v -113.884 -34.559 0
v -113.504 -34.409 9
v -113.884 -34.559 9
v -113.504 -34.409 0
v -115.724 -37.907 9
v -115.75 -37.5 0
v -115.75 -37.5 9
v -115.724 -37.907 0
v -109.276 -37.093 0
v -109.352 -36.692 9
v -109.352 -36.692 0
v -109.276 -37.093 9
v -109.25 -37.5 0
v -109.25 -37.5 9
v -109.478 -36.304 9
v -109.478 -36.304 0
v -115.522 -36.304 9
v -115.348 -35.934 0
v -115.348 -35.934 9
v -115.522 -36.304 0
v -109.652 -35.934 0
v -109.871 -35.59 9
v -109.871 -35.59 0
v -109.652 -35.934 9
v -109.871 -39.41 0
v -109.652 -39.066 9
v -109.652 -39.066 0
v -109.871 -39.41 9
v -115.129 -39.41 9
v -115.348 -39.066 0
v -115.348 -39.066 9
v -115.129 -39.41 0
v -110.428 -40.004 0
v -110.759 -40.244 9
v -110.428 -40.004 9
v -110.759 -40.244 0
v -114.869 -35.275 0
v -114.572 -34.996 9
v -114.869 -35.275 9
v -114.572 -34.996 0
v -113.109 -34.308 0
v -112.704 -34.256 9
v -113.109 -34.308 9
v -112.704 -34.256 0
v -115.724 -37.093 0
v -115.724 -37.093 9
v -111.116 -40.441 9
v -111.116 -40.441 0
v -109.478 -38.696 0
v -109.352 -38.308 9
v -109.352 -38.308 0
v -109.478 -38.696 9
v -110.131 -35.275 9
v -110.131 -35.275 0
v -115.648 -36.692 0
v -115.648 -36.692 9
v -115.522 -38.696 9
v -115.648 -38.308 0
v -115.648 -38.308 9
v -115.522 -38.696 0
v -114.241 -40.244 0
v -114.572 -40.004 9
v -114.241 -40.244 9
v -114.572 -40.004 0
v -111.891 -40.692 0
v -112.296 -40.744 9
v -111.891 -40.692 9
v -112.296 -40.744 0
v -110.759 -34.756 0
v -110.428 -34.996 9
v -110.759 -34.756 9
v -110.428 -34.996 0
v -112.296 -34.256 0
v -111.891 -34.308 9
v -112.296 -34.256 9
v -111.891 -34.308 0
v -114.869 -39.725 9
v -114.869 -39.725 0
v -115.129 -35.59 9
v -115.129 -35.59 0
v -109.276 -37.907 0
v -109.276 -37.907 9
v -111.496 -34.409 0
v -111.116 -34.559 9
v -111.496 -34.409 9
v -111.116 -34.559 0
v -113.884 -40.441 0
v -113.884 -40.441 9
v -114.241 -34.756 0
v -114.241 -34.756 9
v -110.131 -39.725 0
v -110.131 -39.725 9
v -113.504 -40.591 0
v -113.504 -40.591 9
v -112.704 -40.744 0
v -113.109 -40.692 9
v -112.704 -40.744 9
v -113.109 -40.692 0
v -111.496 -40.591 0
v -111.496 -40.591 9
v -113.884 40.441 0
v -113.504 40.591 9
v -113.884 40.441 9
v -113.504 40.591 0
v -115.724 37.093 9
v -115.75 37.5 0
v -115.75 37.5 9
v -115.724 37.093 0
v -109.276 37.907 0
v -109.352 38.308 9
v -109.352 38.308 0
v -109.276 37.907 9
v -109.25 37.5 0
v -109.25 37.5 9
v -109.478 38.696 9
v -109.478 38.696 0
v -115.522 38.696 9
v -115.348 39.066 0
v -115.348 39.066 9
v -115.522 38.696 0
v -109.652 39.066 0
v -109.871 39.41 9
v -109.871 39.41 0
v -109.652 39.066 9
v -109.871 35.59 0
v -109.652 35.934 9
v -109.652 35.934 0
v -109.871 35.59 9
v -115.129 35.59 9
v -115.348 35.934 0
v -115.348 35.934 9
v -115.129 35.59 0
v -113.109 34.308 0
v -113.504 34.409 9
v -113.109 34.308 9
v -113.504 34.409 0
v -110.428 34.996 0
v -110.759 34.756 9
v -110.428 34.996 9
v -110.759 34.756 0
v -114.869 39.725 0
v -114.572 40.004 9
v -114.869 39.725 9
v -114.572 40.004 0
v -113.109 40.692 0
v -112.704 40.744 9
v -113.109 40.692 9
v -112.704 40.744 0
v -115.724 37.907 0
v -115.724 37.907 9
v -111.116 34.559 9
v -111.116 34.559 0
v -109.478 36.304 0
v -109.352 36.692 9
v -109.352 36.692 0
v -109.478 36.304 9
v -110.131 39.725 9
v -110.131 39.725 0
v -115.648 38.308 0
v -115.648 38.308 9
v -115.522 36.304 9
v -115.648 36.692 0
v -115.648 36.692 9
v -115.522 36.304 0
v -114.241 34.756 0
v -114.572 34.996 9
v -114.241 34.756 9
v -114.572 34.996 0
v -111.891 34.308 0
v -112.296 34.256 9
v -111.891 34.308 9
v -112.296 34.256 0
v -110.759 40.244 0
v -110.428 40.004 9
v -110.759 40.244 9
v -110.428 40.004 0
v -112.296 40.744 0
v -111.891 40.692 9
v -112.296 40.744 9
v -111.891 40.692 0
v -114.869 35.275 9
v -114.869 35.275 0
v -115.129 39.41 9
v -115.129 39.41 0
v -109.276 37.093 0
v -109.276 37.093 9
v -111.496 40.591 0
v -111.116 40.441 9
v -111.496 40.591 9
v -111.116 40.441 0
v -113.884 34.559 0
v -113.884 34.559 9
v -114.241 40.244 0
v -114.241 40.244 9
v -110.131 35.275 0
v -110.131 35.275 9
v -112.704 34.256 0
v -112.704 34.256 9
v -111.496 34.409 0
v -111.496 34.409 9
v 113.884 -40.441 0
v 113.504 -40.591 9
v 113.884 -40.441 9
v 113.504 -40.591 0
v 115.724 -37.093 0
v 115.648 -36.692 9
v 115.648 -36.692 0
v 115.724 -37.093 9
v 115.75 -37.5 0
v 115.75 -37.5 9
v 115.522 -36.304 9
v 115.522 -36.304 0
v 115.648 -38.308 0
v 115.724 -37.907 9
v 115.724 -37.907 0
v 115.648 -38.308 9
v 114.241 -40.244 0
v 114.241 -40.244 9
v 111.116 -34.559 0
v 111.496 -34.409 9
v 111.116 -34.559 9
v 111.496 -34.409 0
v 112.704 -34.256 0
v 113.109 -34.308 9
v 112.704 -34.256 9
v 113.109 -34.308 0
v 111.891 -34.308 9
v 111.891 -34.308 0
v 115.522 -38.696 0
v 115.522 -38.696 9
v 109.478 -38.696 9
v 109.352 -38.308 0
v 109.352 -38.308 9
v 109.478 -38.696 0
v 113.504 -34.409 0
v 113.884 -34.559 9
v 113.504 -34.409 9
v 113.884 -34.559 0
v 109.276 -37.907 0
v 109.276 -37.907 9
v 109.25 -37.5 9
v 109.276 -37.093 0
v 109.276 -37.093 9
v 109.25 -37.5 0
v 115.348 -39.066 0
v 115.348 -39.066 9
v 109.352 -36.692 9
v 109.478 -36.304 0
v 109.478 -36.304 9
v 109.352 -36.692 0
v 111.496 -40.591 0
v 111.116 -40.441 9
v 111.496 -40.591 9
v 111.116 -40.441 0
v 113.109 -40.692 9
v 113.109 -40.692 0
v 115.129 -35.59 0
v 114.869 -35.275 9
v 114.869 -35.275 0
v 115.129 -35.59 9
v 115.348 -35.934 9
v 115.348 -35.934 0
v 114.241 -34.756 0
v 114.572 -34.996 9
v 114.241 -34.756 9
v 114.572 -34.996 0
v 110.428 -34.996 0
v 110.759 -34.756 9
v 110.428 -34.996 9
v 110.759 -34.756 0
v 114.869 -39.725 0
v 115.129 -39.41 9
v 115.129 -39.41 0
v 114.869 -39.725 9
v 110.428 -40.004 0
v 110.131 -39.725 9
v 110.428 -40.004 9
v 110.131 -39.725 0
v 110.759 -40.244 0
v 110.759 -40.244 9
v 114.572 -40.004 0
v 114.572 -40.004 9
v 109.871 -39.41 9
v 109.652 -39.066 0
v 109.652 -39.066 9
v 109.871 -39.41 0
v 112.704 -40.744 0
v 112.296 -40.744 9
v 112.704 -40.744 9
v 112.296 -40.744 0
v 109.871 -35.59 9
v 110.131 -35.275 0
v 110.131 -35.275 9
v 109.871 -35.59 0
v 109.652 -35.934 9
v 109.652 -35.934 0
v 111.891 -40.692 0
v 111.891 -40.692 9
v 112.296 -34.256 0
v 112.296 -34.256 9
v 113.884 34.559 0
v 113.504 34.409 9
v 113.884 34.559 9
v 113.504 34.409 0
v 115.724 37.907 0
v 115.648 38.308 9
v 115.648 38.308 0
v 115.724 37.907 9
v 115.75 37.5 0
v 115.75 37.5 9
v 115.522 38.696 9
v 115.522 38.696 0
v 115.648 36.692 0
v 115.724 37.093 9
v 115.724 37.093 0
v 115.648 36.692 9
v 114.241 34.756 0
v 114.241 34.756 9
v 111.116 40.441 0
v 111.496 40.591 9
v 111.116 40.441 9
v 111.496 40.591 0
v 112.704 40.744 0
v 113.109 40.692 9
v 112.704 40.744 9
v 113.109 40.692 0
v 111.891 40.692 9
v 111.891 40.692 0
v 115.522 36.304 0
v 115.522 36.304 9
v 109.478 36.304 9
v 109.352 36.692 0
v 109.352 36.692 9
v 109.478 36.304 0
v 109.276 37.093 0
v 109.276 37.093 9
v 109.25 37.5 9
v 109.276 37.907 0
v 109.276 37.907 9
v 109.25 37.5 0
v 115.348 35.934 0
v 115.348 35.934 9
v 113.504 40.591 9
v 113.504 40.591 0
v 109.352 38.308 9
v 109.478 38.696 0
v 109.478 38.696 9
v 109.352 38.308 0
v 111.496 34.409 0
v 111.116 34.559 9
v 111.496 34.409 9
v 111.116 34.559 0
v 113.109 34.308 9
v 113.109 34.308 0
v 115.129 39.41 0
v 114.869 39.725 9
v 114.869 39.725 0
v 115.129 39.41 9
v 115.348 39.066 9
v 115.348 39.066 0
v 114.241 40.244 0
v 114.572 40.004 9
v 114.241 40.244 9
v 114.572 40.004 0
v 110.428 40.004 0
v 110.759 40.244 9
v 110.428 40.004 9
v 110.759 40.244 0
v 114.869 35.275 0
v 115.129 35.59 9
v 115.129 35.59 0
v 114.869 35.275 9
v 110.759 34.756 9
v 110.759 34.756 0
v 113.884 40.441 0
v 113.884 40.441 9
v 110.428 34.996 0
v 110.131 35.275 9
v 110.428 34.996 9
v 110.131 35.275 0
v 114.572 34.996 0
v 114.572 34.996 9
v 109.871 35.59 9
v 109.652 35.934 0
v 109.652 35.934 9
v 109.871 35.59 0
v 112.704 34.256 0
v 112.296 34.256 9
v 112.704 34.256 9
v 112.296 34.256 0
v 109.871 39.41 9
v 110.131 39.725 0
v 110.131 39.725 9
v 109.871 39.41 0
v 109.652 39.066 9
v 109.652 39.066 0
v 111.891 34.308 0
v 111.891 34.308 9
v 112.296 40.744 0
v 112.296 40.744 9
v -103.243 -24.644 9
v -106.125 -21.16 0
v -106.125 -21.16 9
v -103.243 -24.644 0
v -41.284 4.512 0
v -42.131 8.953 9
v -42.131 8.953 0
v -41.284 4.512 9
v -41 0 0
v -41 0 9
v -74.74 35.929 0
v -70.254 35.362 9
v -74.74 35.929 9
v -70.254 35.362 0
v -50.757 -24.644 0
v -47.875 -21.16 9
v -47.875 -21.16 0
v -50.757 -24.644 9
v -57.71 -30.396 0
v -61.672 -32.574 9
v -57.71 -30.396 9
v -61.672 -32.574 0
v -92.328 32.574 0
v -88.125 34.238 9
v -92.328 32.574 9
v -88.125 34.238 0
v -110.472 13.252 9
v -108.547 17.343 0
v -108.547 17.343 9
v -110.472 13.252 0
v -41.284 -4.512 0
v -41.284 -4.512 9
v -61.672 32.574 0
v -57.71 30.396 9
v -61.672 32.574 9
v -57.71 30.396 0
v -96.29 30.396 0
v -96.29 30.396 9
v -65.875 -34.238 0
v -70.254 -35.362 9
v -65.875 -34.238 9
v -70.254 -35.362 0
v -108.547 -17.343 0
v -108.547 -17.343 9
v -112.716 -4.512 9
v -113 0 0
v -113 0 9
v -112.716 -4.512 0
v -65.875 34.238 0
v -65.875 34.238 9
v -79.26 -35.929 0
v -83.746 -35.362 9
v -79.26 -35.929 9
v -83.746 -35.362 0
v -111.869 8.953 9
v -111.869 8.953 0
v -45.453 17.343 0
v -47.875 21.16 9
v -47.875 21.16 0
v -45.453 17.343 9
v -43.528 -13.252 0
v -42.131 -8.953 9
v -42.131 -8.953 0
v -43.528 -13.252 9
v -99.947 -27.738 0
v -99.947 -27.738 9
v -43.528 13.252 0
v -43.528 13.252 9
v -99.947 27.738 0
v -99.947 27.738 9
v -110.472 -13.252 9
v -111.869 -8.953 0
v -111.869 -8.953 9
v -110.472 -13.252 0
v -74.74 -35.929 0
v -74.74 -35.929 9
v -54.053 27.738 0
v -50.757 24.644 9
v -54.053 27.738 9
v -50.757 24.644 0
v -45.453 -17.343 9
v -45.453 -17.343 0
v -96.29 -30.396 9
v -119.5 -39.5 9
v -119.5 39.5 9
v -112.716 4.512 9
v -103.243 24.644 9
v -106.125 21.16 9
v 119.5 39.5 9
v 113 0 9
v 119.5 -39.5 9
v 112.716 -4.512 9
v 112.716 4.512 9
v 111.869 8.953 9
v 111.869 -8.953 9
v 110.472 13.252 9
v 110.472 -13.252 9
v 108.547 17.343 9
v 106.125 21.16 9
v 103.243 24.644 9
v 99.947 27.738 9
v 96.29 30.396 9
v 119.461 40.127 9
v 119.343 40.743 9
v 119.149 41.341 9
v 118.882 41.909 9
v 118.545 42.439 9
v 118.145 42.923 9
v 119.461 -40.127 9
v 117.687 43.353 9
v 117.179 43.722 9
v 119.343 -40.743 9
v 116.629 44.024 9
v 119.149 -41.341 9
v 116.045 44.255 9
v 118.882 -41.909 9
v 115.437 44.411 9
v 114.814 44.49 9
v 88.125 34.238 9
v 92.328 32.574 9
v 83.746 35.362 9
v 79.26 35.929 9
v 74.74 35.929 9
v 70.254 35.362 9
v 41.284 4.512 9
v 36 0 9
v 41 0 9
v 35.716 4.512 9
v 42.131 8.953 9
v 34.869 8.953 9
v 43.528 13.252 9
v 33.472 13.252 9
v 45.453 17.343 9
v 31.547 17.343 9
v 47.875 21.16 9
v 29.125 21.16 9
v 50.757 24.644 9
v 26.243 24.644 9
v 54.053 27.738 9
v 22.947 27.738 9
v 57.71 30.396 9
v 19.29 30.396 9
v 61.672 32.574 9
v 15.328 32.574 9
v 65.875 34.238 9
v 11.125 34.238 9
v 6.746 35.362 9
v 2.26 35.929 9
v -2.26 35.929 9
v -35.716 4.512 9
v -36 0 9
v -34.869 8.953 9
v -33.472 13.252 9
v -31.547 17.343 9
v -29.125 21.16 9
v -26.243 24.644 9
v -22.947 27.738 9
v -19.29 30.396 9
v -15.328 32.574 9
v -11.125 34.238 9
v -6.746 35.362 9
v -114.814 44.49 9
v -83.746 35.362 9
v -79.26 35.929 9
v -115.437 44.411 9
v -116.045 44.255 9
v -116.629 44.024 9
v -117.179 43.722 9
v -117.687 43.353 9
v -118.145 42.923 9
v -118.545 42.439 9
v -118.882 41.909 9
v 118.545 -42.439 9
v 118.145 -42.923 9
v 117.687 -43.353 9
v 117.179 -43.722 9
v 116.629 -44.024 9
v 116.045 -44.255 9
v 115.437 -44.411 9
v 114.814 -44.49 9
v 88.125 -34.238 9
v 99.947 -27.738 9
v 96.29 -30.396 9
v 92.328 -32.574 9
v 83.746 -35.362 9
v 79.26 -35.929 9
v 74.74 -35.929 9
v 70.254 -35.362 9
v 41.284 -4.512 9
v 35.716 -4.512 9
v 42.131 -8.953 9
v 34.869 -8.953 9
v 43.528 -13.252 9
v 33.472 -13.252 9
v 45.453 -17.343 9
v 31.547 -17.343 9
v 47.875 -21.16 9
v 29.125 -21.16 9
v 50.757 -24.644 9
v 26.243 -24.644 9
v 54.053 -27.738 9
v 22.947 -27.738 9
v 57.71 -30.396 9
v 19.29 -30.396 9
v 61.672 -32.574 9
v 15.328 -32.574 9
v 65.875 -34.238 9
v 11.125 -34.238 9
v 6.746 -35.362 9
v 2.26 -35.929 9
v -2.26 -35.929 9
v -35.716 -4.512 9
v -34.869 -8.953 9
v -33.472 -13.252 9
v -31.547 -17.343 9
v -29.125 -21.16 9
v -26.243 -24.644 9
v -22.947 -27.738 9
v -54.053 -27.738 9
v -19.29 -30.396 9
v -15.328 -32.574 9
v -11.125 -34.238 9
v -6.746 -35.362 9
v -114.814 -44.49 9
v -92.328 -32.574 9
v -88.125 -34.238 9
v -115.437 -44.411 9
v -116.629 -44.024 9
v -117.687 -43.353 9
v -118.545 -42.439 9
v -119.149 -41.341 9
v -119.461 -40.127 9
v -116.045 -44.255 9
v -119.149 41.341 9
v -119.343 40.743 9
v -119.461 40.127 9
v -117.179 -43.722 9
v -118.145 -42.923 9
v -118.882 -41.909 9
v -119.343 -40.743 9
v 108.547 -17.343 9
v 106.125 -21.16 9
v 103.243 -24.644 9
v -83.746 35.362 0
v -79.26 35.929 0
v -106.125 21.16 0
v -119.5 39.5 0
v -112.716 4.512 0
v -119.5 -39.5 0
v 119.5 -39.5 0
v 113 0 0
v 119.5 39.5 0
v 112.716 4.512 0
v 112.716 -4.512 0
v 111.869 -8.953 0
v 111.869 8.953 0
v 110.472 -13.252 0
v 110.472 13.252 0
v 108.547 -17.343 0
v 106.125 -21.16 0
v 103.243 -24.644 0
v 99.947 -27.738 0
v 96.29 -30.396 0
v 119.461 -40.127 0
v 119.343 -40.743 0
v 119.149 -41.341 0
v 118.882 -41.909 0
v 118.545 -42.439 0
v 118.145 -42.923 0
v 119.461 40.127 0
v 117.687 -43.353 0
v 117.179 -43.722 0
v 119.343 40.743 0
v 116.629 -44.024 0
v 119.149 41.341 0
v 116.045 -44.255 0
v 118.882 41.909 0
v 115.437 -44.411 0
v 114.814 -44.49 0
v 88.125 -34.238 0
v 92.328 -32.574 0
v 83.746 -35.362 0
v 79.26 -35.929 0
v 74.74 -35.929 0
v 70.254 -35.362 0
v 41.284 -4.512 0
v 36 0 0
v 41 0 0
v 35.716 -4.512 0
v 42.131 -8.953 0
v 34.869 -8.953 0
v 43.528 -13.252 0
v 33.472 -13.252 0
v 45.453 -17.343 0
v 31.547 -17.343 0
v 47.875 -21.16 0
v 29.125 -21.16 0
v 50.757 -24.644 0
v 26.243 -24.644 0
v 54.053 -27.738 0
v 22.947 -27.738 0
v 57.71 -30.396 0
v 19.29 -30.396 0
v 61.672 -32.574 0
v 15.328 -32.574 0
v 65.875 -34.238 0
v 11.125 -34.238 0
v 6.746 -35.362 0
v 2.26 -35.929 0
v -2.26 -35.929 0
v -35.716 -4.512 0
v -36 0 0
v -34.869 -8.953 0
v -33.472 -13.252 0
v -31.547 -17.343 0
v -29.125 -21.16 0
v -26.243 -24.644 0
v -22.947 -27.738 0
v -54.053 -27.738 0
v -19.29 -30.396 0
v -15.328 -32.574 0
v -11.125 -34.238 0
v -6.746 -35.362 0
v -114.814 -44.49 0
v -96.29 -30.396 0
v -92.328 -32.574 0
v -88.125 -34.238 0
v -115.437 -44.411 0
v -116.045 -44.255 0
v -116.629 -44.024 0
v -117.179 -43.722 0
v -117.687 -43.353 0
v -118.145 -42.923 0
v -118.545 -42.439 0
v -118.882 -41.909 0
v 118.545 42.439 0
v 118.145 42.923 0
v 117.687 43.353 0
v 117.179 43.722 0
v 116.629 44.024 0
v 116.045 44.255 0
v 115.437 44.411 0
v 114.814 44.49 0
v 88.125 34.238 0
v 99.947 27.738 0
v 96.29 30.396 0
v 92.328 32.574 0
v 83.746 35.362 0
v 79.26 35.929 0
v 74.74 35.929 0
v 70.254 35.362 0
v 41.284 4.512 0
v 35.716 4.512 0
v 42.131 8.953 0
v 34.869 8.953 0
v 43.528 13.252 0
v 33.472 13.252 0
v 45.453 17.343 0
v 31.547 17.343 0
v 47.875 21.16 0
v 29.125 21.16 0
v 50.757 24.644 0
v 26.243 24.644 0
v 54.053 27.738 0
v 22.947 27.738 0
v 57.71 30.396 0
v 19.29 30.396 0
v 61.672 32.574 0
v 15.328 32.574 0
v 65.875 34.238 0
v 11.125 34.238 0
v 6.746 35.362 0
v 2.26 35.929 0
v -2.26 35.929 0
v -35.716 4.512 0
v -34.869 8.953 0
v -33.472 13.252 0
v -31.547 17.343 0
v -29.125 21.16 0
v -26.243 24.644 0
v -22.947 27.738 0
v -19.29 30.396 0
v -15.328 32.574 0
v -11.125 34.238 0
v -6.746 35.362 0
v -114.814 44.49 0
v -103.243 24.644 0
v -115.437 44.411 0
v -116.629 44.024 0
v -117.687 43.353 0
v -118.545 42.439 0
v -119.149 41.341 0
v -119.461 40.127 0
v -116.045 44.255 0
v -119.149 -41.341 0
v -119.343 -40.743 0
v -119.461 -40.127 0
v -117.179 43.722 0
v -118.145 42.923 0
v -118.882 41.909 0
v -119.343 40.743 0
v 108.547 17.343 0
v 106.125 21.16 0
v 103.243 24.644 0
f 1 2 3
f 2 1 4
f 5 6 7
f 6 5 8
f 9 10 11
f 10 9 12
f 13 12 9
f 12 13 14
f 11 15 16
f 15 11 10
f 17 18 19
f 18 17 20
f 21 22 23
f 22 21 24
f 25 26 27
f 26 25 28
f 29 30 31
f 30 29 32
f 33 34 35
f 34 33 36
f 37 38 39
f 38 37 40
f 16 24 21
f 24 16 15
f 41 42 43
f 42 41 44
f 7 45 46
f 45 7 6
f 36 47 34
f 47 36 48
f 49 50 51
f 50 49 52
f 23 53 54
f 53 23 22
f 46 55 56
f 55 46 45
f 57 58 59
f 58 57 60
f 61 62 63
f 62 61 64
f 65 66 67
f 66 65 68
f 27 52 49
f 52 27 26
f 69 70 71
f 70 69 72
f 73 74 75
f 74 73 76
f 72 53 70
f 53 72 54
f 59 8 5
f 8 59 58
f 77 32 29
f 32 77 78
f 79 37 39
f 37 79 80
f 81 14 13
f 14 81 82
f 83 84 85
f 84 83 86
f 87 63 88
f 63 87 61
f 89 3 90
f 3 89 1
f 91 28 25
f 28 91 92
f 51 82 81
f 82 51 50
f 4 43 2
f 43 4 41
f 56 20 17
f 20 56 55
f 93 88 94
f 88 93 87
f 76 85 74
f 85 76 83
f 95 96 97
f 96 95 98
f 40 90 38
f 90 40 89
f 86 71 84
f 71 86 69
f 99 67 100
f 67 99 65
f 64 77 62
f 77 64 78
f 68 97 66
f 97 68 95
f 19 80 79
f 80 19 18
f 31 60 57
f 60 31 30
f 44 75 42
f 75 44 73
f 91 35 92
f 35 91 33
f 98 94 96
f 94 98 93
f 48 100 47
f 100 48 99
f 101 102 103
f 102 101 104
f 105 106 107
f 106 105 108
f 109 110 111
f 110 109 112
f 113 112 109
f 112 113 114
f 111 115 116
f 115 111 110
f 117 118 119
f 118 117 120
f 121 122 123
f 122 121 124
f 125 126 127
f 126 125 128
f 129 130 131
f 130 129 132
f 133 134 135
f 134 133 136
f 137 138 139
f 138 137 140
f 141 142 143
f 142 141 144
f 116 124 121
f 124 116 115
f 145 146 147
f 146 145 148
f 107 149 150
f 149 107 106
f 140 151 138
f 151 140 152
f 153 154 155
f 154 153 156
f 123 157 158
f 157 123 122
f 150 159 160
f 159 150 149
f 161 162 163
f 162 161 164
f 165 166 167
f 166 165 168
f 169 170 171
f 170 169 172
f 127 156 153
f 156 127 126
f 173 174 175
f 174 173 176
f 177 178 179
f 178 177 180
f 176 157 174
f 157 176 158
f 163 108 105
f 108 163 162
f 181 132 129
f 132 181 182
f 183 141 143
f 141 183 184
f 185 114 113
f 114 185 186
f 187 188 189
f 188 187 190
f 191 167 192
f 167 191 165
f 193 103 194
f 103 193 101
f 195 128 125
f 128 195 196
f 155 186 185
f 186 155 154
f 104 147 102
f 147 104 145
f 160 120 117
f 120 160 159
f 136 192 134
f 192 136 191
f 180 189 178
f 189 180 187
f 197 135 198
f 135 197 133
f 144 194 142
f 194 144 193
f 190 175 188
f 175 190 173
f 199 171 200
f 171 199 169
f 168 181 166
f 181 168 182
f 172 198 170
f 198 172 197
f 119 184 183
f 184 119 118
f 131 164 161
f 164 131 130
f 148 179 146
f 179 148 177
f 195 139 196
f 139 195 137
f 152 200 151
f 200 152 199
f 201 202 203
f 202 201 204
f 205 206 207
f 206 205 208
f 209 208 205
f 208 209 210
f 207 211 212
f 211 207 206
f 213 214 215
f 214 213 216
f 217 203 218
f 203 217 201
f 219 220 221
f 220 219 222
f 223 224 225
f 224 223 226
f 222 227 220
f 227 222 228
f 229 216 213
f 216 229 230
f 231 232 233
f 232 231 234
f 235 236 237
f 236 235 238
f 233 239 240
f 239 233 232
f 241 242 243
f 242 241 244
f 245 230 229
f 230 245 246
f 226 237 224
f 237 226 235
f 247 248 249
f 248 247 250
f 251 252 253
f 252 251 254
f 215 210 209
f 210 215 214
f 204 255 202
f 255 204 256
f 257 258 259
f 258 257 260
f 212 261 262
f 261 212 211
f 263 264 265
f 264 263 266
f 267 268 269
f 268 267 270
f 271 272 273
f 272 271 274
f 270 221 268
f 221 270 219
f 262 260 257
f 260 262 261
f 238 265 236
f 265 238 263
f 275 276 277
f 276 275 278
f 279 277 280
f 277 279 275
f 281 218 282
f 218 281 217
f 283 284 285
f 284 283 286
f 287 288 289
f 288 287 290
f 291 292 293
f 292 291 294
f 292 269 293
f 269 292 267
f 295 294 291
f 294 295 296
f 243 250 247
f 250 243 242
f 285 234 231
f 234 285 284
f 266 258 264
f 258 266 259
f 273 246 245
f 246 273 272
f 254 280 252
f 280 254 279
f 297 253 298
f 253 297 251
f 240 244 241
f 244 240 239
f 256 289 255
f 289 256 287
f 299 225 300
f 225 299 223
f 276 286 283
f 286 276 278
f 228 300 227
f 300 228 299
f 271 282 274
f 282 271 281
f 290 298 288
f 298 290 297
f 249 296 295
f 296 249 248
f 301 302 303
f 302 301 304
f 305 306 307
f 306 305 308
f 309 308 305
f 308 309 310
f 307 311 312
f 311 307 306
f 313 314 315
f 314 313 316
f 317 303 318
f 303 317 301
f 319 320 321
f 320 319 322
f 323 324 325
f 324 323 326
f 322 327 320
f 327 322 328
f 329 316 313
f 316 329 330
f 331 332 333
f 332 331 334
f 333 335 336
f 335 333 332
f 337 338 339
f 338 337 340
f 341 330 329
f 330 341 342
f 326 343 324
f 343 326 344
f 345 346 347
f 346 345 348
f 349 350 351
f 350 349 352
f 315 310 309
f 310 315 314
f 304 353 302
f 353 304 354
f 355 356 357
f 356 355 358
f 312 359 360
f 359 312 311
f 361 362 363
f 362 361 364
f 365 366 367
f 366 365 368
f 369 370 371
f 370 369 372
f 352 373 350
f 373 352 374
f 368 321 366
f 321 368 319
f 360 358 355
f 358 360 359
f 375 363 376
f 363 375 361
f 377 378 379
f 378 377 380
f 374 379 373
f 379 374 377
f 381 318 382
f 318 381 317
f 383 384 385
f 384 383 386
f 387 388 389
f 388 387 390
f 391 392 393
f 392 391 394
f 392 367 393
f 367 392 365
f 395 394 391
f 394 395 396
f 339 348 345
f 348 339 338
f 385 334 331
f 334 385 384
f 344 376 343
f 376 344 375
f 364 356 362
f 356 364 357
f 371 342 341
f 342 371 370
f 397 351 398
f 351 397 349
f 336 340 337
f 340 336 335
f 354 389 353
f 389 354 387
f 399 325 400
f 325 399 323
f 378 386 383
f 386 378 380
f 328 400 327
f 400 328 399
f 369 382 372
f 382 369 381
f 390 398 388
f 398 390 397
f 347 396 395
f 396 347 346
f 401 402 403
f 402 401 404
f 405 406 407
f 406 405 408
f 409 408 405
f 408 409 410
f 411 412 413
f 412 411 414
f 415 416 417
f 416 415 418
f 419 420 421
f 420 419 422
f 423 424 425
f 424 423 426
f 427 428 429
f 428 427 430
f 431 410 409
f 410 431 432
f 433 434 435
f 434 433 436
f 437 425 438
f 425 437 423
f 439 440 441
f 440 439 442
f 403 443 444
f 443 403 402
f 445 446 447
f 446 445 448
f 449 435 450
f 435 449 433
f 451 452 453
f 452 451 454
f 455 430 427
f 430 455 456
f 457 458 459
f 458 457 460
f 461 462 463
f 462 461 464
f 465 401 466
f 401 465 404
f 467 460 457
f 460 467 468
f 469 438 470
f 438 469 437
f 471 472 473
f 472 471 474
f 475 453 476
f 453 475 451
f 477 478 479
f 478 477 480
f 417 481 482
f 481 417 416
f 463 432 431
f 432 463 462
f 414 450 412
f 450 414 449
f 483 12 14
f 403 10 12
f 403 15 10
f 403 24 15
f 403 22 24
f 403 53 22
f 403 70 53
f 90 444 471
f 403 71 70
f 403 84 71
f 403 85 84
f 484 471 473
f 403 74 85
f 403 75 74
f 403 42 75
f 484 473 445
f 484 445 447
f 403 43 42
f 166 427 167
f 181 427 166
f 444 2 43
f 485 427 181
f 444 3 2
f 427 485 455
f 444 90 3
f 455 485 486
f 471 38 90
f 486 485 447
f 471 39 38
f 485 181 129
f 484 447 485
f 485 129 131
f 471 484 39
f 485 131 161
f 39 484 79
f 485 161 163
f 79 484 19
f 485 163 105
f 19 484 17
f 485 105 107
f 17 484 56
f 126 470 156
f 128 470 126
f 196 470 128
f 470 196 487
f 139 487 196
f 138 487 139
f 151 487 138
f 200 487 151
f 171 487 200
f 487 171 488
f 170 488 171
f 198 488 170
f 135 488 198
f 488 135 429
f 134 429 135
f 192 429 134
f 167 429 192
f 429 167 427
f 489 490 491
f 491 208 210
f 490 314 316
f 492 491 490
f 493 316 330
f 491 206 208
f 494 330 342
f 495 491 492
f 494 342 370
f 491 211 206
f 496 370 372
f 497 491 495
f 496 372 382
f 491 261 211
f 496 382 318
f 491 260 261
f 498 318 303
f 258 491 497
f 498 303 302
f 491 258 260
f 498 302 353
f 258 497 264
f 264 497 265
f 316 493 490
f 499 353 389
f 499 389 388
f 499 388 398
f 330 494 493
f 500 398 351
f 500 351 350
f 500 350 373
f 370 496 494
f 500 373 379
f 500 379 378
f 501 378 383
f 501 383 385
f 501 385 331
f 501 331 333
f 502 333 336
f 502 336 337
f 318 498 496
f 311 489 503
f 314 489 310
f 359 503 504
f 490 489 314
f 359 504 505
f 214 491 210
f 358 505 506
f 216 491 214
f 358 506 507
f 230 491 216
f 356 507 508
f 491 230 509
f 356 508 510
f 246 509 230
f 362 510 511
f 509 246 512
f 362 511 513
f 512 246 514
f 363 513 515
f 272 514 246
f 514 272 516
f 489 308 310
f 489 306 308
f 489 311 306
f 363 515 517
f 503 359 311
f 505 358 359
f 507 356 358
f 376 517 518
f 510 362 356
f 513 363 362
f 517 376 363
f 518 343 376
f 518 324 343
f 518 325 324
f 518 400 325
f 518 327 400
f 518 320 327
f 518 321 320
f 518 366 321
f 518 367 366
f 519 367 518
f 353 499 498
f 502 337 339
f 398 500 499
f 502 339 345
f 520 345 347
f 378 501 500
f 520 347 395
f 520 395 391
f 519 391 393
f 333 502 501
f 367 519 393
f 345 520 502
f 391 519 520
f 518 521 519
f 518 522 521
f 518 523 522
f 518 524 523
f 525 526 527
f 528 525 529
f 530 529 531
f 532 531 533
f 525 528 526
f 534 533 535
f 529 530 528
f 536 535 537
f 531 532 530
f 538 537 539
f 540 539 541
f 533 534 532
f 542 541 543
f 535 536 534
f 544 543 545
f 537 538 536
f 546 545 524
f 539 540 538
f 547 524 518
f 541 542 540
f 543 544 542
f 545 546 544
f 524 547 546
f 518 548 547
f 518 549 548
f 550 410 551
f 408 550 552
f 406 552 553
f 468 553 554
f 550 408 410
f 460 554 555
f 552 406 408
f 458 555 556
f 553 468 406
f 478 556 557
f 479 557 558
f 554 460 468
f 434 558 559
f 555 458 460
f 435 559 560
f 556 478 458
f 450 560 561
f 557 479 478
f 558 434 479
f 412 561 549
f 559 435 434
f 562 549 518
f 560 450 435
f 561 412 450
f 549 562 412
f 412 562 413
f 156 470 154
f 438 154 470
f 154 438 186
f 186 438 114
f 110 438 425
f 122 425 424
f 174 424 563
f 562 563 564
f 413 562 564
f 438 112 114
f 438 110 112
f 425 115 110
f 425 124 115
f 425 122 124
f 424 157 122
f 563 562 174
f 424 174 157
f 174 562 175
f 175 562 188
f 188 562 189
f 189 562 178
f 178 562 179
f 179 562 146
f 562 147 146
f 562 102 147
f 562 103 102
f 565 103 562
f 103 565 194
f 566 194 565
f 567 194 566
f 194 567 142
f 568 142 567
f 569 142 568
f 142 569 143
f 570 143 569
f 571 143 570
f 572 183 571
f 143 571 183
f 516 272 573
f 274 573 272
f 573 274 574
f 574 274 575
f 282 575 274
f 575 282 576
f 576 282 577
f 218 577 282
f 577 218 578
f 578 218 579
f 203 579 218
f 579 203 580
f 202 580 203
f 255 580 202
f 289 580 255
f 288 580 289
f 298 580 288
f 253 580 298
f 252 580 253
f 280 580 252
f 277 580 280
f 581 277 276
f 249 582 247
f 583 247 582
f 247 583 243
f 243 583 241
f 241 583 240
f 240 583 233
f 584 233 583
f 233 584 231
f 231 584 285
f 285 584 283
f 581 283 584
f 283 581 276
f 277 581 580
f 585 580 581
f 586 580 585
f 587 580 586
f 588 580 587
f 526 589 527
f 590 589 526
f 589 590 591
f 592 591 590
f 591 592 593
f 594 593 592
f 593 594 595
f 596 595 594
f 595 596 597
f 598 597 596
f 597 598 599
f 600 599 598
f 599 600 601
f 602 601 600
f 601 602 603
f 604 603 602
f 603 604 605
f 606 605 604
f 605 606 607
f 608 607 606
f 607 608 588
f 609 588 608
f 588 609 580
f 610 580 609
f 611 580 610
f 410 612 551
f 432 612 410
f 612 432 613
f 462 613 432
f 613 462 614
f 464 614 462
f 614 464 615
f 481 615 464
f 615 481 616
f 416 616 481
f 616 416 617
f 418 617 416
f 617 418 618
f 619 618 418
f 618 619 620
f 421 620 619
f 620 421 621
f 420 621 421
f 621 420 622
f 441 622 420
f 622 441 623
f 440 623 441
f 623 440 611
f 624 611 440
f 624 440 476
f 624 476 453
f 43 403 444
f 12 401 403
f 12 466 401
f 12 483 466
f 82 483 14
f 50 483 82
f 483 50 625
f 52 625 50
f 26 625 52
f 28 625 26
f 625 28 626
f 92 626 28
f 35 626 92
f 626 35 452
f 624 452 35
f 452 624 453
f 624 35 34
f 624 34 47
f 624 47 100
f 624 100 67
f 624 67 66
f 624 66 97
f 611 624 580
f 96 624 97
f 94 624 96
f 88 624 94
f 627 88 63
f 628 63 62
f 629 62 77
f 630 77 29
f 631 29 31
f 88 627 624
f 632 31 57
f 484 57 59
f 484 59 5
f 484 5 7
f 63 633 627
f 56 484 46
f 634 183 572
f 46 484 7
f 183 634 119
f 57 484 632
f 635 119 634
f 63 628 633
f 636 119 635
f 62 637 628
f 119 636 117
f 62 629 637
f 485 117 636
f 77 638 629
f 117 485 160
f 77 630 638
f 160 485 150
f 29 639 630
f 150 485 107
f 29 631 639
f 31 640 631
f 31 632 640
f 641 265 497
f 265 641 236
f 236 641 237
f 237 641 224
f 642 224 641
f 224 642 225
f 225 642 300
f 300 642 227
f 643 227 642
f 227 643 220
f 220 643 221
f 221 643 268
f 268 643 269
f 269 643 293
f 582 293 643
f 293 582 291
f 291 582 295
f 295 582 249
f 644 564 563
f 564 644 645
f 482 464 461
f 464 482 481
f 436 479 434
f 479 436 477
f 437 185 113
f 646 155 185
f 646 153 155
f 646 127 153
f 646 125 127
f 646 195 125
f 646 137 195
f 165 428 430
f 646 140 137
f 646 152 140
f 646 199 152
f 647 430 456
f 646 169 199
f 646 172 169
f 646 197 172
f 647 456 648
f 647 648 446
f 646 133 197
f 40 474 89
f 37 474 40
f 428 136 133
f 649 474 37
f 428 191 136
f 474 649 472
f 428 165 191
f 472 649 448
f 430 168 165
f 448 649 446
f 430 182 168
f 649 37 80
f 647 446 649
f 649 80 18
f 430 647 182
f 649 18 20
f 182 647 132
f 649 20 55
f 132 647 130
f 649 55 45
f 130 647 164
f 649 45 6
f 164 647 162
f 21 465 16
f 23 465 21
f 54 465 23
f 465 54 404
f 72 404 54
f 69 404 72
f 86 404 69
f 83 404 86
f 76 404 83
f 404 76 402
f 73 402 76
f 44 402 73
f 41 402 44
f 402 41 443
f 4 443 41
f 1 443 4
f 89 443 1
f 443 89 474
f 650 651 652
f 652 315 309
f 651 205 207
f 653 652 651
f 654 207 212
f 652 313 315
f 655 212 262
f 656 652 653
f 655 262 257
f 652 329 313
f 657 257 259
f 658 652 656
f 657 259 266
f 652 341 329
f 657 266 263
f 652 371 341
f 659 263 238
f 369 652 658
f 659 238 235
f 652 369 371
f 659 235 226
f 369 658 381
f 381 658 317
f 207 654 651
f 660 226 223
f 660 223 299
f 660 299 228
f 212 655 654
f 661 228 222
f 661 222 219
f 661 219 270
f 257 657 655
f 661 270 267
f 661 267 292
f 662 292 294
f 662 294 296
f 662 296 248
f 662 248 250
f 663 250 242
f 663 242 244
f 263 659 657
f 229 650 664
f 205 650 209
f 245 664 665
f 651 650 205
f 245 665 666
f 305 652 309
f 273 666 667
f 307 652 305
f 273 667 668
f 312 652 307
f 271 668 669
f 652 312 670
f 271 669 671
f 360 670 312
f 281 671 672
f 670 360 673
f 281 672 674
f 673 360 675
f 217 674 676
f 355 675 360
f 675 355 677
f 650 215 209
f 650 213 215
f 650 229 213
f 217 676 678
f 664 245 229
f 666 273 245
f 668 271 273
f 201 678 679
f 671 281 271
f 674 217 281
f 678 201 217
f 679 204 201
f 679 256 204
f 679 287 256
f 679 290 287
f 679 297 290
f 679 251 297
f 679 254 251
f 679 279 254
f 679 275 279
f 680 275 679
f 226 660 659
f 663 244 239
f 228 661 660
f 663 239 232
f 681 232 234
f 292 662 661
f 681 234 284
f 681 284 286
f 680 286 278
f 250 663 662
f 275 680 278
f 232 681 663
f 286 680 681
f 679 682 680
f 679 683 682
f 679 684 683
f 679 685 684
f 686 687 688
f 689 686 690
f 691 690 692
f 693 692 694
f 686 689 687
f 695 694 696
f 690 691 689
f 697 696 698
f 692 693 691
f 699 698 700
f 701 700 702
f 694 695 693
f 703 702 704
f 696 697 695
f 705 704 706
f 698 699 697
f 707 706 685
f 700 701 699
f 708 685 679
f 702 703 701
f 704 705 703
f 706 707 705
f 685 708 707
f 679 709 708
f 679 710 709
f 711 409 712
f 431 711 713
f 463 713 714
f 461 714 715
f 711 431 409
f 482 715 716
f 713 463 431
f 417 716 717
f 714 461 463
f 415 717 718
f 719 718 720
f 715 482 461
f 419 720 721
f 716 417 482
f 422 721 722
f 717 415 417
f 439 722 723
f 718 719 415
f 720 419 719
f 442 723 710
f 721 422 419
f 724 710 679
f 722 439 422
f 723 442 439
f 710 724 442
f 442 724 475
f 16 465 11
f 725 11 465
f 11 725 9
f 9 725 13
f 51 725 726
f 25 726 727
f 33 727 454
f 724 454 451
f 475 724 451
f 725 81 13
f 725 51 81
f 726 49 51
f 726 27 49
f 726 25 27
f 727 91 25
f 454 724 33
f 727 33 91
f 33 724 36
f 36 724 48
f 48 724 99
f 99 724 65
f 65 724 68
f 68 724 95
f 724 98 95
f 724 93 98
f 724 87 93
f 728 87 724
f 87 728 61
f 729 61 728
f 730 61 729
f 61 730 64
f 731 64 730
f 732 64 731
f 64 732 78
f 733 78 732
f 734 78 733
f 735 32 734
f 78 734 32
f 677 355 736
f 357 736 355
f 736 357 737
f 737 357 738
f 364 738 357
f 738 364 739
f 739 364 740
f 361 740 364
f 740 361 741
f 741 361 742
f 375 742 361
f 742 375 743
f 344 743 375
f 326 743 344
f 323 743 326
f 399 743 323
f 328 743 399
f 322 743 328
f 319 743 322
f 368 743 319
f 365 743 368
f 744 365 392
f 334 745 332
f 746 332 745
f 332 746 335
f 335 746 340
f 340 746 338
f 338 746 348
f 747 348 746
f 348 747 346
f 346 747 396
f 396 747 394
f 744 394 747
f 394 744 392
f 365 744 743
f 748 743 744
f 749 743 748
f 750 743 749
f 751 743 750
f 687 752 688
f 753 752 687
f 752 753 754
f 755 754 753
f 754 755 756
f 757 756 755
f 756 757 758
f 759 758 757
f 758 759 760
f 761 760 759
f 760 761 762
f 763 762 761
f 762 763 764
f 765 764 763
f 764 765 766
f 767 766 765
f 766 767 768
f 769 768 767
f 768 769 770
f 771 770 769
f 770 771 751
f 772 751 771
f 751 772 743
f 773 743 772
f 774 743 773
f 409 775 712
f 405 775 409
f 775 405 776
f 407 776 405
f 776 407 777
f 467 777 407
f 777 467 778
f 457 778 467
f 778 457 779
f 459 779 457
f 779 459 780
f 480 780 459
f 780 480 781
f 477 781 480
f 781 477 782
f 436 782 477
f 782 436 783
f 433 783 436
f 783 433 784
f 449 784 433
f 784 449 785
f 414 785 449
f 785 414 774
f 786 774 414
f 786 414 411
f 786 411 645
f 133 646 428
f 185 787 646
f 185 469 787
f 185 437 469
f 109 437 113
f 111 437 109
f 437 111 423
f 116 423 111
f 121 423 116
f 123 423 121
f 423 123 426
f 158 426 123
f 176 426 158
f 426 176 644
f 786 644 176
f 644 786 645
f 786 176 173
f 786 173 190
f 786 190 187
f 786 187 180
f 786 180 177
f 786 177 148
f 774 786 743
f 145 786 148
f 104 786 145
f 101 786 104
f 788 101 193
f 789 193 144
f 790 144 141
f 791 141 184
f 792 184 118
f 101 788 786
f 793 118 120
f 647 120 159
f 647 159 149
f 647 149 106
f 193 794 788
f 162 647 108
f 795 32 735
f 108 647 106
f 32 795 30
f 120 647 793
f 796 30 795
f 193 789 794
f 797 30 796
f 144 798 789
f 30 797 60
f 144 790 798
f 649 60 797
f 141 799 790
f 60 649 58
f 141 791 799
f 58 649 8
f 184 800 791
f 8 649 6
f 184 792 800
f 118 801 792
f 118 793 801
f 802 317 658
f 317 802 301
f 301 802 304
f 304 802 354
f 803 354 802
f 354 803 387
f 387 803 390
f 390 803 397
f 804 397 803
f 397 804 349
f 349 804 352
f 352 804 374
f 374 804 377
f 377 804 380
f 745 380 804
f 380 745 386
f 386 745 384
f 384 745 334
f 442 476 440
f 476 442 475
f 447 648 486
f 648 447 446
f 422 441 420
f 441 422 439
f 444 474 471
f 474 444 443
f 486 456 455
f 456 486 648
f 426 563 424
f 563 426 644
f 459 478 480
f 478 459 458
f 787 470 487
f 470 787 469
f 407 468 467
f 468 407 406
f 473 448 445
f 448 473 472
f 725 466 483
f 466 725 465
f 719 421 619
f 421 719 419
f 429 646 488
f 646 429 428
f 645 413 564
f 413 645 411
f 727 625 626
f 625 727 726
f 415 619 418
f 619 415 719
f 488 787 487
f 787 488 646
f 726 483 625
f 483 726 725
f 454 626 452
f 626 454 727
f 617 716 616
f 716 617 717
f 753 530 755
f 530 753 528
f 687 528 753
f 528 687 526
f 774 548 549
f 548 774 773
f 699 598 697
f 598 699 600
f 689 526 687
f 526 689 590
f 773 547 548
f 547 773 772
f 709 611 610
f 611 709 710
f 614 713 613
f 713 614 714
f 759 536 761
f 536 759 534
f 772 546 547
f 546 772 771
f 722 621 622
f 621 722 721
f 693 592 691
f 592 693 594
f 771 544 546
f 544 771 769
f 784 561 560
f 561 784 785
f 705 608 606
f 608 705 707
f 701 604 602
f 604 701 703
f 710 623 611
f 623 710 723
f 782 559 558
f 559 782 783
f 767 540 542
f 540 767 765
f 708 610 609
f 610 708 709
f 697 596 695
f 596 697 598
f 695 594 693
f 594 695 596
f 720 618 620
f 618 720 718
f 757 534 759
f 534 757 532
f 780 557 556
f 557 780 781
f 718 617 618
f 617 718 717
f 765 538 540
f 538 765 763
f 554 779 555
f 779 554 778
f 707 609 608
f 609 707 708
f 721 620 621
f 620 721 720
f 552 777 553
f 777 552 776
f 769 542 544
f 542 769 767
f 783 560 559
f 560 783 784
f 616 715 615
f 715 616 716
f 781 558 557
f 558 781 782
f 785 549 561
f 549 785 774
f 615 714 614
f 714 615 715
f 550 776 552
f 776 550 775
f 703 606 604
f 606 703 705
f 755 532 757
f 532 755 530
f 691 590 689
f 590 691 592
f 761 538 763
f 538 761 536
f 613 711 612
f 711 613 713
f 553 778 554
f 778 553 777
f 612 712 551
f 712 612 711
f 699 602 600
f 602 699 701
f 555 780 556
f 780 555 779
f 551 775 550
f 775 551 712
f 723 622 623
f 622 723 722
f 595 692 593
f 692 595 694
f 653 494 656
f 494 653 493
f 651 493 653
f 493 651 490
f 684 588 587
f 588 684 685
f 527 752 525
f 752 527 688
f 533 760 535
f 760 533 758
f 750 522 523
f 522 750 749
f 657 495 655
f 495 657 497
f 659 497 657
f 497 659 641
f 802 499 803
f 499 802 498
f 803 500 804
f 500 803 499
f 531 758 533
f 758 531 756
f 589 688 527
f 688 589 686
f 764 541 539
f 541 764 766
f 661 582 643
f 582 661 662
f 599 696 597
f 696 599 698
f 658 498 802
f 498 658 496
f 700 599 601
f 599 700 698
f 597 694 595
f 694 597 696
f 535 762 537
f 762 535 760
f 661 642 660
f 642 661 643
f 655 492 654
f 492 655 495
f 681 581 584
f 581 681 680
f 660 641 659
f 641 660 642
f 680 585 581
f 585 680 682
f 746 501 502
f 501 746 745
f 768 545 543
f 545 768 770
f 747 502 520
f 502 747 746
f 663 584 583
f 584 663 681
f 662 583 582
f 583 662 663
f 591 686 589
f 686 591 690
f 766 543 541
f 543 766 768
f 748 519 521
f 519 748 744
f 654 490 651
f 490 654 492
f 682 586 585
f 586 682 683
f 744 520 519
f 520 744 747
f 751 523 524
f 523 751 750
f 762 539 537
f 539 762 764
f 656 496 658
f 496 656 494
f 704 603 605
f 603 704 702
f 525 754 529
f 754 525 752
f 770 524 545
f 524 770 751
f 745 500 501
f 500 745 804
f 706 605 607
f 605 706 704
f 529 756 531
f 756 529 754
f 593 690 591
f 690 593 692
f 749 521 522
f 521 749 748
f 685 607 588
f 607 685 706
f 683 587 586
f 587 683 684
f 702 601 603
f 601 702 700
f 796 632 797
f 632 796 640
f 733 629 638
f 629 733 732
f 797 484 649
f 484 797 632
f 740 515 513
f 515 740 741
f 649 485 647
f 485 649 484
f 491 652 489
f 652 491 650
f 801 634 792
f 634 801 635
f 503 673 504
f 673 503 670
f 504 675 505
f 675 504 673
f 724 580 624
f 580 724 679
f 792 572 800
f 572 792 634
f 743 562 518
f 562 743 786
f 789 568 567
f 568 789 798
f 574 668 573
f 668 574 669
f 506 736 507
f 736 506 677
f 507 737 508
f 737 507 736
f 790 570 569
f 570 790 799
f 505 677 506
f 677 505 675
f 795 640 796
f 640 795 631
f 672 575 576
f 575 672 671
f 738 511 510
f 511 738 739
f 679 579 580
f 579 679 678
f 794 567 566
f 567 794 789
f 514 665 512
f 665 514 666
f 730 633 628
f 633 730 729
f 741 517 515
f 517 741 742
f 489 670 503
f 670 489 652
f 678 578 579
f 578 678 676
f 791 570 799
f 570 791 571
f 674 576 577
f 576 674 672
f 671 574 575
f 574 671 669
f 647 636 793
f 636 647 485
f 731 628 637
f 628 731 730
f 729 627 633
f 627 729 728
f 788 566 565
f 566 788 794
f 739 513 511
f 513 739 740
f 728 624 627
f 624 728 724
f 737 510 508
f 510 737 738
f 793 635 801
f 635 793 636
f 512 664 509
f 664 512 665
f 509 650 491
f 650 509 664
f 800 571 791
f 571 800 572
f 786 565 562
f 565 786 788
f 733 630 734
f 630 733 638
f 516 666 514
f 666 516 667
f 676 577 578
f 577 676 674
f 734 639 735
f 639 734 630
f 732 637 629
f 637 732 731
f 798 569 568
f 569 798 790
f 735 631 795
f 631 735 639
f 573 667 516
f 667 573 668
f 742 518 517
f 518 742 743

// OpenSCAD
$fn = 50;


difference() {
	union() {
		hull() {
			translate(v = [-114.5000000000, 39.5000000000, 0]) {
				cylinder(h = 9, r = 5);
			}
			translate(v = [114.5000000000, 39.5000000000, 0]) {
				cylinder(h = 9, r = 5);
			}
			translate(v = [-114.5000000000, -39.5000000000, 0]) {
				cylinder(h = 9, r = 5);
			}
			translate(v = [114.5000000000, -39.5000000000, 0]) {
				cylinder(h = 9, r = 5);
			}
		}
	}
	union() {
		#translate(v = [-112.5000000000, -37.5000000000, -100.0000000000]) {
			cylinder(h = 200, r = 3.2500000000);
		}
		#translate(v = [-112.5000000000, 37.5000000000, -100.0000000000]) {
			cylinder(h = 200, r = 3.2500000000);
		}
		#translate(v = [112.5000000000, -37.5000000000, -100.0000000000]) {
			cylinder(h = 200, r = 3.2500000000);
		}
		#translate(v = [112.5000000000, 37.5000000000, -100.0000000000]) {
			cylinder(h = 200, r = 3.2500000000);
		}
		#translate(v = [-77.0000000000, 0, 0]) {
			cylinder(h = 9, r = 36.0000000000);
		}
		#cylinder(h = 9, r = 36.0000000000);
		#translate(v = [77.0000000000, 0, 0]) {
			cylinder(h = 9, r = 36.0000000000);
		}
	}
}
